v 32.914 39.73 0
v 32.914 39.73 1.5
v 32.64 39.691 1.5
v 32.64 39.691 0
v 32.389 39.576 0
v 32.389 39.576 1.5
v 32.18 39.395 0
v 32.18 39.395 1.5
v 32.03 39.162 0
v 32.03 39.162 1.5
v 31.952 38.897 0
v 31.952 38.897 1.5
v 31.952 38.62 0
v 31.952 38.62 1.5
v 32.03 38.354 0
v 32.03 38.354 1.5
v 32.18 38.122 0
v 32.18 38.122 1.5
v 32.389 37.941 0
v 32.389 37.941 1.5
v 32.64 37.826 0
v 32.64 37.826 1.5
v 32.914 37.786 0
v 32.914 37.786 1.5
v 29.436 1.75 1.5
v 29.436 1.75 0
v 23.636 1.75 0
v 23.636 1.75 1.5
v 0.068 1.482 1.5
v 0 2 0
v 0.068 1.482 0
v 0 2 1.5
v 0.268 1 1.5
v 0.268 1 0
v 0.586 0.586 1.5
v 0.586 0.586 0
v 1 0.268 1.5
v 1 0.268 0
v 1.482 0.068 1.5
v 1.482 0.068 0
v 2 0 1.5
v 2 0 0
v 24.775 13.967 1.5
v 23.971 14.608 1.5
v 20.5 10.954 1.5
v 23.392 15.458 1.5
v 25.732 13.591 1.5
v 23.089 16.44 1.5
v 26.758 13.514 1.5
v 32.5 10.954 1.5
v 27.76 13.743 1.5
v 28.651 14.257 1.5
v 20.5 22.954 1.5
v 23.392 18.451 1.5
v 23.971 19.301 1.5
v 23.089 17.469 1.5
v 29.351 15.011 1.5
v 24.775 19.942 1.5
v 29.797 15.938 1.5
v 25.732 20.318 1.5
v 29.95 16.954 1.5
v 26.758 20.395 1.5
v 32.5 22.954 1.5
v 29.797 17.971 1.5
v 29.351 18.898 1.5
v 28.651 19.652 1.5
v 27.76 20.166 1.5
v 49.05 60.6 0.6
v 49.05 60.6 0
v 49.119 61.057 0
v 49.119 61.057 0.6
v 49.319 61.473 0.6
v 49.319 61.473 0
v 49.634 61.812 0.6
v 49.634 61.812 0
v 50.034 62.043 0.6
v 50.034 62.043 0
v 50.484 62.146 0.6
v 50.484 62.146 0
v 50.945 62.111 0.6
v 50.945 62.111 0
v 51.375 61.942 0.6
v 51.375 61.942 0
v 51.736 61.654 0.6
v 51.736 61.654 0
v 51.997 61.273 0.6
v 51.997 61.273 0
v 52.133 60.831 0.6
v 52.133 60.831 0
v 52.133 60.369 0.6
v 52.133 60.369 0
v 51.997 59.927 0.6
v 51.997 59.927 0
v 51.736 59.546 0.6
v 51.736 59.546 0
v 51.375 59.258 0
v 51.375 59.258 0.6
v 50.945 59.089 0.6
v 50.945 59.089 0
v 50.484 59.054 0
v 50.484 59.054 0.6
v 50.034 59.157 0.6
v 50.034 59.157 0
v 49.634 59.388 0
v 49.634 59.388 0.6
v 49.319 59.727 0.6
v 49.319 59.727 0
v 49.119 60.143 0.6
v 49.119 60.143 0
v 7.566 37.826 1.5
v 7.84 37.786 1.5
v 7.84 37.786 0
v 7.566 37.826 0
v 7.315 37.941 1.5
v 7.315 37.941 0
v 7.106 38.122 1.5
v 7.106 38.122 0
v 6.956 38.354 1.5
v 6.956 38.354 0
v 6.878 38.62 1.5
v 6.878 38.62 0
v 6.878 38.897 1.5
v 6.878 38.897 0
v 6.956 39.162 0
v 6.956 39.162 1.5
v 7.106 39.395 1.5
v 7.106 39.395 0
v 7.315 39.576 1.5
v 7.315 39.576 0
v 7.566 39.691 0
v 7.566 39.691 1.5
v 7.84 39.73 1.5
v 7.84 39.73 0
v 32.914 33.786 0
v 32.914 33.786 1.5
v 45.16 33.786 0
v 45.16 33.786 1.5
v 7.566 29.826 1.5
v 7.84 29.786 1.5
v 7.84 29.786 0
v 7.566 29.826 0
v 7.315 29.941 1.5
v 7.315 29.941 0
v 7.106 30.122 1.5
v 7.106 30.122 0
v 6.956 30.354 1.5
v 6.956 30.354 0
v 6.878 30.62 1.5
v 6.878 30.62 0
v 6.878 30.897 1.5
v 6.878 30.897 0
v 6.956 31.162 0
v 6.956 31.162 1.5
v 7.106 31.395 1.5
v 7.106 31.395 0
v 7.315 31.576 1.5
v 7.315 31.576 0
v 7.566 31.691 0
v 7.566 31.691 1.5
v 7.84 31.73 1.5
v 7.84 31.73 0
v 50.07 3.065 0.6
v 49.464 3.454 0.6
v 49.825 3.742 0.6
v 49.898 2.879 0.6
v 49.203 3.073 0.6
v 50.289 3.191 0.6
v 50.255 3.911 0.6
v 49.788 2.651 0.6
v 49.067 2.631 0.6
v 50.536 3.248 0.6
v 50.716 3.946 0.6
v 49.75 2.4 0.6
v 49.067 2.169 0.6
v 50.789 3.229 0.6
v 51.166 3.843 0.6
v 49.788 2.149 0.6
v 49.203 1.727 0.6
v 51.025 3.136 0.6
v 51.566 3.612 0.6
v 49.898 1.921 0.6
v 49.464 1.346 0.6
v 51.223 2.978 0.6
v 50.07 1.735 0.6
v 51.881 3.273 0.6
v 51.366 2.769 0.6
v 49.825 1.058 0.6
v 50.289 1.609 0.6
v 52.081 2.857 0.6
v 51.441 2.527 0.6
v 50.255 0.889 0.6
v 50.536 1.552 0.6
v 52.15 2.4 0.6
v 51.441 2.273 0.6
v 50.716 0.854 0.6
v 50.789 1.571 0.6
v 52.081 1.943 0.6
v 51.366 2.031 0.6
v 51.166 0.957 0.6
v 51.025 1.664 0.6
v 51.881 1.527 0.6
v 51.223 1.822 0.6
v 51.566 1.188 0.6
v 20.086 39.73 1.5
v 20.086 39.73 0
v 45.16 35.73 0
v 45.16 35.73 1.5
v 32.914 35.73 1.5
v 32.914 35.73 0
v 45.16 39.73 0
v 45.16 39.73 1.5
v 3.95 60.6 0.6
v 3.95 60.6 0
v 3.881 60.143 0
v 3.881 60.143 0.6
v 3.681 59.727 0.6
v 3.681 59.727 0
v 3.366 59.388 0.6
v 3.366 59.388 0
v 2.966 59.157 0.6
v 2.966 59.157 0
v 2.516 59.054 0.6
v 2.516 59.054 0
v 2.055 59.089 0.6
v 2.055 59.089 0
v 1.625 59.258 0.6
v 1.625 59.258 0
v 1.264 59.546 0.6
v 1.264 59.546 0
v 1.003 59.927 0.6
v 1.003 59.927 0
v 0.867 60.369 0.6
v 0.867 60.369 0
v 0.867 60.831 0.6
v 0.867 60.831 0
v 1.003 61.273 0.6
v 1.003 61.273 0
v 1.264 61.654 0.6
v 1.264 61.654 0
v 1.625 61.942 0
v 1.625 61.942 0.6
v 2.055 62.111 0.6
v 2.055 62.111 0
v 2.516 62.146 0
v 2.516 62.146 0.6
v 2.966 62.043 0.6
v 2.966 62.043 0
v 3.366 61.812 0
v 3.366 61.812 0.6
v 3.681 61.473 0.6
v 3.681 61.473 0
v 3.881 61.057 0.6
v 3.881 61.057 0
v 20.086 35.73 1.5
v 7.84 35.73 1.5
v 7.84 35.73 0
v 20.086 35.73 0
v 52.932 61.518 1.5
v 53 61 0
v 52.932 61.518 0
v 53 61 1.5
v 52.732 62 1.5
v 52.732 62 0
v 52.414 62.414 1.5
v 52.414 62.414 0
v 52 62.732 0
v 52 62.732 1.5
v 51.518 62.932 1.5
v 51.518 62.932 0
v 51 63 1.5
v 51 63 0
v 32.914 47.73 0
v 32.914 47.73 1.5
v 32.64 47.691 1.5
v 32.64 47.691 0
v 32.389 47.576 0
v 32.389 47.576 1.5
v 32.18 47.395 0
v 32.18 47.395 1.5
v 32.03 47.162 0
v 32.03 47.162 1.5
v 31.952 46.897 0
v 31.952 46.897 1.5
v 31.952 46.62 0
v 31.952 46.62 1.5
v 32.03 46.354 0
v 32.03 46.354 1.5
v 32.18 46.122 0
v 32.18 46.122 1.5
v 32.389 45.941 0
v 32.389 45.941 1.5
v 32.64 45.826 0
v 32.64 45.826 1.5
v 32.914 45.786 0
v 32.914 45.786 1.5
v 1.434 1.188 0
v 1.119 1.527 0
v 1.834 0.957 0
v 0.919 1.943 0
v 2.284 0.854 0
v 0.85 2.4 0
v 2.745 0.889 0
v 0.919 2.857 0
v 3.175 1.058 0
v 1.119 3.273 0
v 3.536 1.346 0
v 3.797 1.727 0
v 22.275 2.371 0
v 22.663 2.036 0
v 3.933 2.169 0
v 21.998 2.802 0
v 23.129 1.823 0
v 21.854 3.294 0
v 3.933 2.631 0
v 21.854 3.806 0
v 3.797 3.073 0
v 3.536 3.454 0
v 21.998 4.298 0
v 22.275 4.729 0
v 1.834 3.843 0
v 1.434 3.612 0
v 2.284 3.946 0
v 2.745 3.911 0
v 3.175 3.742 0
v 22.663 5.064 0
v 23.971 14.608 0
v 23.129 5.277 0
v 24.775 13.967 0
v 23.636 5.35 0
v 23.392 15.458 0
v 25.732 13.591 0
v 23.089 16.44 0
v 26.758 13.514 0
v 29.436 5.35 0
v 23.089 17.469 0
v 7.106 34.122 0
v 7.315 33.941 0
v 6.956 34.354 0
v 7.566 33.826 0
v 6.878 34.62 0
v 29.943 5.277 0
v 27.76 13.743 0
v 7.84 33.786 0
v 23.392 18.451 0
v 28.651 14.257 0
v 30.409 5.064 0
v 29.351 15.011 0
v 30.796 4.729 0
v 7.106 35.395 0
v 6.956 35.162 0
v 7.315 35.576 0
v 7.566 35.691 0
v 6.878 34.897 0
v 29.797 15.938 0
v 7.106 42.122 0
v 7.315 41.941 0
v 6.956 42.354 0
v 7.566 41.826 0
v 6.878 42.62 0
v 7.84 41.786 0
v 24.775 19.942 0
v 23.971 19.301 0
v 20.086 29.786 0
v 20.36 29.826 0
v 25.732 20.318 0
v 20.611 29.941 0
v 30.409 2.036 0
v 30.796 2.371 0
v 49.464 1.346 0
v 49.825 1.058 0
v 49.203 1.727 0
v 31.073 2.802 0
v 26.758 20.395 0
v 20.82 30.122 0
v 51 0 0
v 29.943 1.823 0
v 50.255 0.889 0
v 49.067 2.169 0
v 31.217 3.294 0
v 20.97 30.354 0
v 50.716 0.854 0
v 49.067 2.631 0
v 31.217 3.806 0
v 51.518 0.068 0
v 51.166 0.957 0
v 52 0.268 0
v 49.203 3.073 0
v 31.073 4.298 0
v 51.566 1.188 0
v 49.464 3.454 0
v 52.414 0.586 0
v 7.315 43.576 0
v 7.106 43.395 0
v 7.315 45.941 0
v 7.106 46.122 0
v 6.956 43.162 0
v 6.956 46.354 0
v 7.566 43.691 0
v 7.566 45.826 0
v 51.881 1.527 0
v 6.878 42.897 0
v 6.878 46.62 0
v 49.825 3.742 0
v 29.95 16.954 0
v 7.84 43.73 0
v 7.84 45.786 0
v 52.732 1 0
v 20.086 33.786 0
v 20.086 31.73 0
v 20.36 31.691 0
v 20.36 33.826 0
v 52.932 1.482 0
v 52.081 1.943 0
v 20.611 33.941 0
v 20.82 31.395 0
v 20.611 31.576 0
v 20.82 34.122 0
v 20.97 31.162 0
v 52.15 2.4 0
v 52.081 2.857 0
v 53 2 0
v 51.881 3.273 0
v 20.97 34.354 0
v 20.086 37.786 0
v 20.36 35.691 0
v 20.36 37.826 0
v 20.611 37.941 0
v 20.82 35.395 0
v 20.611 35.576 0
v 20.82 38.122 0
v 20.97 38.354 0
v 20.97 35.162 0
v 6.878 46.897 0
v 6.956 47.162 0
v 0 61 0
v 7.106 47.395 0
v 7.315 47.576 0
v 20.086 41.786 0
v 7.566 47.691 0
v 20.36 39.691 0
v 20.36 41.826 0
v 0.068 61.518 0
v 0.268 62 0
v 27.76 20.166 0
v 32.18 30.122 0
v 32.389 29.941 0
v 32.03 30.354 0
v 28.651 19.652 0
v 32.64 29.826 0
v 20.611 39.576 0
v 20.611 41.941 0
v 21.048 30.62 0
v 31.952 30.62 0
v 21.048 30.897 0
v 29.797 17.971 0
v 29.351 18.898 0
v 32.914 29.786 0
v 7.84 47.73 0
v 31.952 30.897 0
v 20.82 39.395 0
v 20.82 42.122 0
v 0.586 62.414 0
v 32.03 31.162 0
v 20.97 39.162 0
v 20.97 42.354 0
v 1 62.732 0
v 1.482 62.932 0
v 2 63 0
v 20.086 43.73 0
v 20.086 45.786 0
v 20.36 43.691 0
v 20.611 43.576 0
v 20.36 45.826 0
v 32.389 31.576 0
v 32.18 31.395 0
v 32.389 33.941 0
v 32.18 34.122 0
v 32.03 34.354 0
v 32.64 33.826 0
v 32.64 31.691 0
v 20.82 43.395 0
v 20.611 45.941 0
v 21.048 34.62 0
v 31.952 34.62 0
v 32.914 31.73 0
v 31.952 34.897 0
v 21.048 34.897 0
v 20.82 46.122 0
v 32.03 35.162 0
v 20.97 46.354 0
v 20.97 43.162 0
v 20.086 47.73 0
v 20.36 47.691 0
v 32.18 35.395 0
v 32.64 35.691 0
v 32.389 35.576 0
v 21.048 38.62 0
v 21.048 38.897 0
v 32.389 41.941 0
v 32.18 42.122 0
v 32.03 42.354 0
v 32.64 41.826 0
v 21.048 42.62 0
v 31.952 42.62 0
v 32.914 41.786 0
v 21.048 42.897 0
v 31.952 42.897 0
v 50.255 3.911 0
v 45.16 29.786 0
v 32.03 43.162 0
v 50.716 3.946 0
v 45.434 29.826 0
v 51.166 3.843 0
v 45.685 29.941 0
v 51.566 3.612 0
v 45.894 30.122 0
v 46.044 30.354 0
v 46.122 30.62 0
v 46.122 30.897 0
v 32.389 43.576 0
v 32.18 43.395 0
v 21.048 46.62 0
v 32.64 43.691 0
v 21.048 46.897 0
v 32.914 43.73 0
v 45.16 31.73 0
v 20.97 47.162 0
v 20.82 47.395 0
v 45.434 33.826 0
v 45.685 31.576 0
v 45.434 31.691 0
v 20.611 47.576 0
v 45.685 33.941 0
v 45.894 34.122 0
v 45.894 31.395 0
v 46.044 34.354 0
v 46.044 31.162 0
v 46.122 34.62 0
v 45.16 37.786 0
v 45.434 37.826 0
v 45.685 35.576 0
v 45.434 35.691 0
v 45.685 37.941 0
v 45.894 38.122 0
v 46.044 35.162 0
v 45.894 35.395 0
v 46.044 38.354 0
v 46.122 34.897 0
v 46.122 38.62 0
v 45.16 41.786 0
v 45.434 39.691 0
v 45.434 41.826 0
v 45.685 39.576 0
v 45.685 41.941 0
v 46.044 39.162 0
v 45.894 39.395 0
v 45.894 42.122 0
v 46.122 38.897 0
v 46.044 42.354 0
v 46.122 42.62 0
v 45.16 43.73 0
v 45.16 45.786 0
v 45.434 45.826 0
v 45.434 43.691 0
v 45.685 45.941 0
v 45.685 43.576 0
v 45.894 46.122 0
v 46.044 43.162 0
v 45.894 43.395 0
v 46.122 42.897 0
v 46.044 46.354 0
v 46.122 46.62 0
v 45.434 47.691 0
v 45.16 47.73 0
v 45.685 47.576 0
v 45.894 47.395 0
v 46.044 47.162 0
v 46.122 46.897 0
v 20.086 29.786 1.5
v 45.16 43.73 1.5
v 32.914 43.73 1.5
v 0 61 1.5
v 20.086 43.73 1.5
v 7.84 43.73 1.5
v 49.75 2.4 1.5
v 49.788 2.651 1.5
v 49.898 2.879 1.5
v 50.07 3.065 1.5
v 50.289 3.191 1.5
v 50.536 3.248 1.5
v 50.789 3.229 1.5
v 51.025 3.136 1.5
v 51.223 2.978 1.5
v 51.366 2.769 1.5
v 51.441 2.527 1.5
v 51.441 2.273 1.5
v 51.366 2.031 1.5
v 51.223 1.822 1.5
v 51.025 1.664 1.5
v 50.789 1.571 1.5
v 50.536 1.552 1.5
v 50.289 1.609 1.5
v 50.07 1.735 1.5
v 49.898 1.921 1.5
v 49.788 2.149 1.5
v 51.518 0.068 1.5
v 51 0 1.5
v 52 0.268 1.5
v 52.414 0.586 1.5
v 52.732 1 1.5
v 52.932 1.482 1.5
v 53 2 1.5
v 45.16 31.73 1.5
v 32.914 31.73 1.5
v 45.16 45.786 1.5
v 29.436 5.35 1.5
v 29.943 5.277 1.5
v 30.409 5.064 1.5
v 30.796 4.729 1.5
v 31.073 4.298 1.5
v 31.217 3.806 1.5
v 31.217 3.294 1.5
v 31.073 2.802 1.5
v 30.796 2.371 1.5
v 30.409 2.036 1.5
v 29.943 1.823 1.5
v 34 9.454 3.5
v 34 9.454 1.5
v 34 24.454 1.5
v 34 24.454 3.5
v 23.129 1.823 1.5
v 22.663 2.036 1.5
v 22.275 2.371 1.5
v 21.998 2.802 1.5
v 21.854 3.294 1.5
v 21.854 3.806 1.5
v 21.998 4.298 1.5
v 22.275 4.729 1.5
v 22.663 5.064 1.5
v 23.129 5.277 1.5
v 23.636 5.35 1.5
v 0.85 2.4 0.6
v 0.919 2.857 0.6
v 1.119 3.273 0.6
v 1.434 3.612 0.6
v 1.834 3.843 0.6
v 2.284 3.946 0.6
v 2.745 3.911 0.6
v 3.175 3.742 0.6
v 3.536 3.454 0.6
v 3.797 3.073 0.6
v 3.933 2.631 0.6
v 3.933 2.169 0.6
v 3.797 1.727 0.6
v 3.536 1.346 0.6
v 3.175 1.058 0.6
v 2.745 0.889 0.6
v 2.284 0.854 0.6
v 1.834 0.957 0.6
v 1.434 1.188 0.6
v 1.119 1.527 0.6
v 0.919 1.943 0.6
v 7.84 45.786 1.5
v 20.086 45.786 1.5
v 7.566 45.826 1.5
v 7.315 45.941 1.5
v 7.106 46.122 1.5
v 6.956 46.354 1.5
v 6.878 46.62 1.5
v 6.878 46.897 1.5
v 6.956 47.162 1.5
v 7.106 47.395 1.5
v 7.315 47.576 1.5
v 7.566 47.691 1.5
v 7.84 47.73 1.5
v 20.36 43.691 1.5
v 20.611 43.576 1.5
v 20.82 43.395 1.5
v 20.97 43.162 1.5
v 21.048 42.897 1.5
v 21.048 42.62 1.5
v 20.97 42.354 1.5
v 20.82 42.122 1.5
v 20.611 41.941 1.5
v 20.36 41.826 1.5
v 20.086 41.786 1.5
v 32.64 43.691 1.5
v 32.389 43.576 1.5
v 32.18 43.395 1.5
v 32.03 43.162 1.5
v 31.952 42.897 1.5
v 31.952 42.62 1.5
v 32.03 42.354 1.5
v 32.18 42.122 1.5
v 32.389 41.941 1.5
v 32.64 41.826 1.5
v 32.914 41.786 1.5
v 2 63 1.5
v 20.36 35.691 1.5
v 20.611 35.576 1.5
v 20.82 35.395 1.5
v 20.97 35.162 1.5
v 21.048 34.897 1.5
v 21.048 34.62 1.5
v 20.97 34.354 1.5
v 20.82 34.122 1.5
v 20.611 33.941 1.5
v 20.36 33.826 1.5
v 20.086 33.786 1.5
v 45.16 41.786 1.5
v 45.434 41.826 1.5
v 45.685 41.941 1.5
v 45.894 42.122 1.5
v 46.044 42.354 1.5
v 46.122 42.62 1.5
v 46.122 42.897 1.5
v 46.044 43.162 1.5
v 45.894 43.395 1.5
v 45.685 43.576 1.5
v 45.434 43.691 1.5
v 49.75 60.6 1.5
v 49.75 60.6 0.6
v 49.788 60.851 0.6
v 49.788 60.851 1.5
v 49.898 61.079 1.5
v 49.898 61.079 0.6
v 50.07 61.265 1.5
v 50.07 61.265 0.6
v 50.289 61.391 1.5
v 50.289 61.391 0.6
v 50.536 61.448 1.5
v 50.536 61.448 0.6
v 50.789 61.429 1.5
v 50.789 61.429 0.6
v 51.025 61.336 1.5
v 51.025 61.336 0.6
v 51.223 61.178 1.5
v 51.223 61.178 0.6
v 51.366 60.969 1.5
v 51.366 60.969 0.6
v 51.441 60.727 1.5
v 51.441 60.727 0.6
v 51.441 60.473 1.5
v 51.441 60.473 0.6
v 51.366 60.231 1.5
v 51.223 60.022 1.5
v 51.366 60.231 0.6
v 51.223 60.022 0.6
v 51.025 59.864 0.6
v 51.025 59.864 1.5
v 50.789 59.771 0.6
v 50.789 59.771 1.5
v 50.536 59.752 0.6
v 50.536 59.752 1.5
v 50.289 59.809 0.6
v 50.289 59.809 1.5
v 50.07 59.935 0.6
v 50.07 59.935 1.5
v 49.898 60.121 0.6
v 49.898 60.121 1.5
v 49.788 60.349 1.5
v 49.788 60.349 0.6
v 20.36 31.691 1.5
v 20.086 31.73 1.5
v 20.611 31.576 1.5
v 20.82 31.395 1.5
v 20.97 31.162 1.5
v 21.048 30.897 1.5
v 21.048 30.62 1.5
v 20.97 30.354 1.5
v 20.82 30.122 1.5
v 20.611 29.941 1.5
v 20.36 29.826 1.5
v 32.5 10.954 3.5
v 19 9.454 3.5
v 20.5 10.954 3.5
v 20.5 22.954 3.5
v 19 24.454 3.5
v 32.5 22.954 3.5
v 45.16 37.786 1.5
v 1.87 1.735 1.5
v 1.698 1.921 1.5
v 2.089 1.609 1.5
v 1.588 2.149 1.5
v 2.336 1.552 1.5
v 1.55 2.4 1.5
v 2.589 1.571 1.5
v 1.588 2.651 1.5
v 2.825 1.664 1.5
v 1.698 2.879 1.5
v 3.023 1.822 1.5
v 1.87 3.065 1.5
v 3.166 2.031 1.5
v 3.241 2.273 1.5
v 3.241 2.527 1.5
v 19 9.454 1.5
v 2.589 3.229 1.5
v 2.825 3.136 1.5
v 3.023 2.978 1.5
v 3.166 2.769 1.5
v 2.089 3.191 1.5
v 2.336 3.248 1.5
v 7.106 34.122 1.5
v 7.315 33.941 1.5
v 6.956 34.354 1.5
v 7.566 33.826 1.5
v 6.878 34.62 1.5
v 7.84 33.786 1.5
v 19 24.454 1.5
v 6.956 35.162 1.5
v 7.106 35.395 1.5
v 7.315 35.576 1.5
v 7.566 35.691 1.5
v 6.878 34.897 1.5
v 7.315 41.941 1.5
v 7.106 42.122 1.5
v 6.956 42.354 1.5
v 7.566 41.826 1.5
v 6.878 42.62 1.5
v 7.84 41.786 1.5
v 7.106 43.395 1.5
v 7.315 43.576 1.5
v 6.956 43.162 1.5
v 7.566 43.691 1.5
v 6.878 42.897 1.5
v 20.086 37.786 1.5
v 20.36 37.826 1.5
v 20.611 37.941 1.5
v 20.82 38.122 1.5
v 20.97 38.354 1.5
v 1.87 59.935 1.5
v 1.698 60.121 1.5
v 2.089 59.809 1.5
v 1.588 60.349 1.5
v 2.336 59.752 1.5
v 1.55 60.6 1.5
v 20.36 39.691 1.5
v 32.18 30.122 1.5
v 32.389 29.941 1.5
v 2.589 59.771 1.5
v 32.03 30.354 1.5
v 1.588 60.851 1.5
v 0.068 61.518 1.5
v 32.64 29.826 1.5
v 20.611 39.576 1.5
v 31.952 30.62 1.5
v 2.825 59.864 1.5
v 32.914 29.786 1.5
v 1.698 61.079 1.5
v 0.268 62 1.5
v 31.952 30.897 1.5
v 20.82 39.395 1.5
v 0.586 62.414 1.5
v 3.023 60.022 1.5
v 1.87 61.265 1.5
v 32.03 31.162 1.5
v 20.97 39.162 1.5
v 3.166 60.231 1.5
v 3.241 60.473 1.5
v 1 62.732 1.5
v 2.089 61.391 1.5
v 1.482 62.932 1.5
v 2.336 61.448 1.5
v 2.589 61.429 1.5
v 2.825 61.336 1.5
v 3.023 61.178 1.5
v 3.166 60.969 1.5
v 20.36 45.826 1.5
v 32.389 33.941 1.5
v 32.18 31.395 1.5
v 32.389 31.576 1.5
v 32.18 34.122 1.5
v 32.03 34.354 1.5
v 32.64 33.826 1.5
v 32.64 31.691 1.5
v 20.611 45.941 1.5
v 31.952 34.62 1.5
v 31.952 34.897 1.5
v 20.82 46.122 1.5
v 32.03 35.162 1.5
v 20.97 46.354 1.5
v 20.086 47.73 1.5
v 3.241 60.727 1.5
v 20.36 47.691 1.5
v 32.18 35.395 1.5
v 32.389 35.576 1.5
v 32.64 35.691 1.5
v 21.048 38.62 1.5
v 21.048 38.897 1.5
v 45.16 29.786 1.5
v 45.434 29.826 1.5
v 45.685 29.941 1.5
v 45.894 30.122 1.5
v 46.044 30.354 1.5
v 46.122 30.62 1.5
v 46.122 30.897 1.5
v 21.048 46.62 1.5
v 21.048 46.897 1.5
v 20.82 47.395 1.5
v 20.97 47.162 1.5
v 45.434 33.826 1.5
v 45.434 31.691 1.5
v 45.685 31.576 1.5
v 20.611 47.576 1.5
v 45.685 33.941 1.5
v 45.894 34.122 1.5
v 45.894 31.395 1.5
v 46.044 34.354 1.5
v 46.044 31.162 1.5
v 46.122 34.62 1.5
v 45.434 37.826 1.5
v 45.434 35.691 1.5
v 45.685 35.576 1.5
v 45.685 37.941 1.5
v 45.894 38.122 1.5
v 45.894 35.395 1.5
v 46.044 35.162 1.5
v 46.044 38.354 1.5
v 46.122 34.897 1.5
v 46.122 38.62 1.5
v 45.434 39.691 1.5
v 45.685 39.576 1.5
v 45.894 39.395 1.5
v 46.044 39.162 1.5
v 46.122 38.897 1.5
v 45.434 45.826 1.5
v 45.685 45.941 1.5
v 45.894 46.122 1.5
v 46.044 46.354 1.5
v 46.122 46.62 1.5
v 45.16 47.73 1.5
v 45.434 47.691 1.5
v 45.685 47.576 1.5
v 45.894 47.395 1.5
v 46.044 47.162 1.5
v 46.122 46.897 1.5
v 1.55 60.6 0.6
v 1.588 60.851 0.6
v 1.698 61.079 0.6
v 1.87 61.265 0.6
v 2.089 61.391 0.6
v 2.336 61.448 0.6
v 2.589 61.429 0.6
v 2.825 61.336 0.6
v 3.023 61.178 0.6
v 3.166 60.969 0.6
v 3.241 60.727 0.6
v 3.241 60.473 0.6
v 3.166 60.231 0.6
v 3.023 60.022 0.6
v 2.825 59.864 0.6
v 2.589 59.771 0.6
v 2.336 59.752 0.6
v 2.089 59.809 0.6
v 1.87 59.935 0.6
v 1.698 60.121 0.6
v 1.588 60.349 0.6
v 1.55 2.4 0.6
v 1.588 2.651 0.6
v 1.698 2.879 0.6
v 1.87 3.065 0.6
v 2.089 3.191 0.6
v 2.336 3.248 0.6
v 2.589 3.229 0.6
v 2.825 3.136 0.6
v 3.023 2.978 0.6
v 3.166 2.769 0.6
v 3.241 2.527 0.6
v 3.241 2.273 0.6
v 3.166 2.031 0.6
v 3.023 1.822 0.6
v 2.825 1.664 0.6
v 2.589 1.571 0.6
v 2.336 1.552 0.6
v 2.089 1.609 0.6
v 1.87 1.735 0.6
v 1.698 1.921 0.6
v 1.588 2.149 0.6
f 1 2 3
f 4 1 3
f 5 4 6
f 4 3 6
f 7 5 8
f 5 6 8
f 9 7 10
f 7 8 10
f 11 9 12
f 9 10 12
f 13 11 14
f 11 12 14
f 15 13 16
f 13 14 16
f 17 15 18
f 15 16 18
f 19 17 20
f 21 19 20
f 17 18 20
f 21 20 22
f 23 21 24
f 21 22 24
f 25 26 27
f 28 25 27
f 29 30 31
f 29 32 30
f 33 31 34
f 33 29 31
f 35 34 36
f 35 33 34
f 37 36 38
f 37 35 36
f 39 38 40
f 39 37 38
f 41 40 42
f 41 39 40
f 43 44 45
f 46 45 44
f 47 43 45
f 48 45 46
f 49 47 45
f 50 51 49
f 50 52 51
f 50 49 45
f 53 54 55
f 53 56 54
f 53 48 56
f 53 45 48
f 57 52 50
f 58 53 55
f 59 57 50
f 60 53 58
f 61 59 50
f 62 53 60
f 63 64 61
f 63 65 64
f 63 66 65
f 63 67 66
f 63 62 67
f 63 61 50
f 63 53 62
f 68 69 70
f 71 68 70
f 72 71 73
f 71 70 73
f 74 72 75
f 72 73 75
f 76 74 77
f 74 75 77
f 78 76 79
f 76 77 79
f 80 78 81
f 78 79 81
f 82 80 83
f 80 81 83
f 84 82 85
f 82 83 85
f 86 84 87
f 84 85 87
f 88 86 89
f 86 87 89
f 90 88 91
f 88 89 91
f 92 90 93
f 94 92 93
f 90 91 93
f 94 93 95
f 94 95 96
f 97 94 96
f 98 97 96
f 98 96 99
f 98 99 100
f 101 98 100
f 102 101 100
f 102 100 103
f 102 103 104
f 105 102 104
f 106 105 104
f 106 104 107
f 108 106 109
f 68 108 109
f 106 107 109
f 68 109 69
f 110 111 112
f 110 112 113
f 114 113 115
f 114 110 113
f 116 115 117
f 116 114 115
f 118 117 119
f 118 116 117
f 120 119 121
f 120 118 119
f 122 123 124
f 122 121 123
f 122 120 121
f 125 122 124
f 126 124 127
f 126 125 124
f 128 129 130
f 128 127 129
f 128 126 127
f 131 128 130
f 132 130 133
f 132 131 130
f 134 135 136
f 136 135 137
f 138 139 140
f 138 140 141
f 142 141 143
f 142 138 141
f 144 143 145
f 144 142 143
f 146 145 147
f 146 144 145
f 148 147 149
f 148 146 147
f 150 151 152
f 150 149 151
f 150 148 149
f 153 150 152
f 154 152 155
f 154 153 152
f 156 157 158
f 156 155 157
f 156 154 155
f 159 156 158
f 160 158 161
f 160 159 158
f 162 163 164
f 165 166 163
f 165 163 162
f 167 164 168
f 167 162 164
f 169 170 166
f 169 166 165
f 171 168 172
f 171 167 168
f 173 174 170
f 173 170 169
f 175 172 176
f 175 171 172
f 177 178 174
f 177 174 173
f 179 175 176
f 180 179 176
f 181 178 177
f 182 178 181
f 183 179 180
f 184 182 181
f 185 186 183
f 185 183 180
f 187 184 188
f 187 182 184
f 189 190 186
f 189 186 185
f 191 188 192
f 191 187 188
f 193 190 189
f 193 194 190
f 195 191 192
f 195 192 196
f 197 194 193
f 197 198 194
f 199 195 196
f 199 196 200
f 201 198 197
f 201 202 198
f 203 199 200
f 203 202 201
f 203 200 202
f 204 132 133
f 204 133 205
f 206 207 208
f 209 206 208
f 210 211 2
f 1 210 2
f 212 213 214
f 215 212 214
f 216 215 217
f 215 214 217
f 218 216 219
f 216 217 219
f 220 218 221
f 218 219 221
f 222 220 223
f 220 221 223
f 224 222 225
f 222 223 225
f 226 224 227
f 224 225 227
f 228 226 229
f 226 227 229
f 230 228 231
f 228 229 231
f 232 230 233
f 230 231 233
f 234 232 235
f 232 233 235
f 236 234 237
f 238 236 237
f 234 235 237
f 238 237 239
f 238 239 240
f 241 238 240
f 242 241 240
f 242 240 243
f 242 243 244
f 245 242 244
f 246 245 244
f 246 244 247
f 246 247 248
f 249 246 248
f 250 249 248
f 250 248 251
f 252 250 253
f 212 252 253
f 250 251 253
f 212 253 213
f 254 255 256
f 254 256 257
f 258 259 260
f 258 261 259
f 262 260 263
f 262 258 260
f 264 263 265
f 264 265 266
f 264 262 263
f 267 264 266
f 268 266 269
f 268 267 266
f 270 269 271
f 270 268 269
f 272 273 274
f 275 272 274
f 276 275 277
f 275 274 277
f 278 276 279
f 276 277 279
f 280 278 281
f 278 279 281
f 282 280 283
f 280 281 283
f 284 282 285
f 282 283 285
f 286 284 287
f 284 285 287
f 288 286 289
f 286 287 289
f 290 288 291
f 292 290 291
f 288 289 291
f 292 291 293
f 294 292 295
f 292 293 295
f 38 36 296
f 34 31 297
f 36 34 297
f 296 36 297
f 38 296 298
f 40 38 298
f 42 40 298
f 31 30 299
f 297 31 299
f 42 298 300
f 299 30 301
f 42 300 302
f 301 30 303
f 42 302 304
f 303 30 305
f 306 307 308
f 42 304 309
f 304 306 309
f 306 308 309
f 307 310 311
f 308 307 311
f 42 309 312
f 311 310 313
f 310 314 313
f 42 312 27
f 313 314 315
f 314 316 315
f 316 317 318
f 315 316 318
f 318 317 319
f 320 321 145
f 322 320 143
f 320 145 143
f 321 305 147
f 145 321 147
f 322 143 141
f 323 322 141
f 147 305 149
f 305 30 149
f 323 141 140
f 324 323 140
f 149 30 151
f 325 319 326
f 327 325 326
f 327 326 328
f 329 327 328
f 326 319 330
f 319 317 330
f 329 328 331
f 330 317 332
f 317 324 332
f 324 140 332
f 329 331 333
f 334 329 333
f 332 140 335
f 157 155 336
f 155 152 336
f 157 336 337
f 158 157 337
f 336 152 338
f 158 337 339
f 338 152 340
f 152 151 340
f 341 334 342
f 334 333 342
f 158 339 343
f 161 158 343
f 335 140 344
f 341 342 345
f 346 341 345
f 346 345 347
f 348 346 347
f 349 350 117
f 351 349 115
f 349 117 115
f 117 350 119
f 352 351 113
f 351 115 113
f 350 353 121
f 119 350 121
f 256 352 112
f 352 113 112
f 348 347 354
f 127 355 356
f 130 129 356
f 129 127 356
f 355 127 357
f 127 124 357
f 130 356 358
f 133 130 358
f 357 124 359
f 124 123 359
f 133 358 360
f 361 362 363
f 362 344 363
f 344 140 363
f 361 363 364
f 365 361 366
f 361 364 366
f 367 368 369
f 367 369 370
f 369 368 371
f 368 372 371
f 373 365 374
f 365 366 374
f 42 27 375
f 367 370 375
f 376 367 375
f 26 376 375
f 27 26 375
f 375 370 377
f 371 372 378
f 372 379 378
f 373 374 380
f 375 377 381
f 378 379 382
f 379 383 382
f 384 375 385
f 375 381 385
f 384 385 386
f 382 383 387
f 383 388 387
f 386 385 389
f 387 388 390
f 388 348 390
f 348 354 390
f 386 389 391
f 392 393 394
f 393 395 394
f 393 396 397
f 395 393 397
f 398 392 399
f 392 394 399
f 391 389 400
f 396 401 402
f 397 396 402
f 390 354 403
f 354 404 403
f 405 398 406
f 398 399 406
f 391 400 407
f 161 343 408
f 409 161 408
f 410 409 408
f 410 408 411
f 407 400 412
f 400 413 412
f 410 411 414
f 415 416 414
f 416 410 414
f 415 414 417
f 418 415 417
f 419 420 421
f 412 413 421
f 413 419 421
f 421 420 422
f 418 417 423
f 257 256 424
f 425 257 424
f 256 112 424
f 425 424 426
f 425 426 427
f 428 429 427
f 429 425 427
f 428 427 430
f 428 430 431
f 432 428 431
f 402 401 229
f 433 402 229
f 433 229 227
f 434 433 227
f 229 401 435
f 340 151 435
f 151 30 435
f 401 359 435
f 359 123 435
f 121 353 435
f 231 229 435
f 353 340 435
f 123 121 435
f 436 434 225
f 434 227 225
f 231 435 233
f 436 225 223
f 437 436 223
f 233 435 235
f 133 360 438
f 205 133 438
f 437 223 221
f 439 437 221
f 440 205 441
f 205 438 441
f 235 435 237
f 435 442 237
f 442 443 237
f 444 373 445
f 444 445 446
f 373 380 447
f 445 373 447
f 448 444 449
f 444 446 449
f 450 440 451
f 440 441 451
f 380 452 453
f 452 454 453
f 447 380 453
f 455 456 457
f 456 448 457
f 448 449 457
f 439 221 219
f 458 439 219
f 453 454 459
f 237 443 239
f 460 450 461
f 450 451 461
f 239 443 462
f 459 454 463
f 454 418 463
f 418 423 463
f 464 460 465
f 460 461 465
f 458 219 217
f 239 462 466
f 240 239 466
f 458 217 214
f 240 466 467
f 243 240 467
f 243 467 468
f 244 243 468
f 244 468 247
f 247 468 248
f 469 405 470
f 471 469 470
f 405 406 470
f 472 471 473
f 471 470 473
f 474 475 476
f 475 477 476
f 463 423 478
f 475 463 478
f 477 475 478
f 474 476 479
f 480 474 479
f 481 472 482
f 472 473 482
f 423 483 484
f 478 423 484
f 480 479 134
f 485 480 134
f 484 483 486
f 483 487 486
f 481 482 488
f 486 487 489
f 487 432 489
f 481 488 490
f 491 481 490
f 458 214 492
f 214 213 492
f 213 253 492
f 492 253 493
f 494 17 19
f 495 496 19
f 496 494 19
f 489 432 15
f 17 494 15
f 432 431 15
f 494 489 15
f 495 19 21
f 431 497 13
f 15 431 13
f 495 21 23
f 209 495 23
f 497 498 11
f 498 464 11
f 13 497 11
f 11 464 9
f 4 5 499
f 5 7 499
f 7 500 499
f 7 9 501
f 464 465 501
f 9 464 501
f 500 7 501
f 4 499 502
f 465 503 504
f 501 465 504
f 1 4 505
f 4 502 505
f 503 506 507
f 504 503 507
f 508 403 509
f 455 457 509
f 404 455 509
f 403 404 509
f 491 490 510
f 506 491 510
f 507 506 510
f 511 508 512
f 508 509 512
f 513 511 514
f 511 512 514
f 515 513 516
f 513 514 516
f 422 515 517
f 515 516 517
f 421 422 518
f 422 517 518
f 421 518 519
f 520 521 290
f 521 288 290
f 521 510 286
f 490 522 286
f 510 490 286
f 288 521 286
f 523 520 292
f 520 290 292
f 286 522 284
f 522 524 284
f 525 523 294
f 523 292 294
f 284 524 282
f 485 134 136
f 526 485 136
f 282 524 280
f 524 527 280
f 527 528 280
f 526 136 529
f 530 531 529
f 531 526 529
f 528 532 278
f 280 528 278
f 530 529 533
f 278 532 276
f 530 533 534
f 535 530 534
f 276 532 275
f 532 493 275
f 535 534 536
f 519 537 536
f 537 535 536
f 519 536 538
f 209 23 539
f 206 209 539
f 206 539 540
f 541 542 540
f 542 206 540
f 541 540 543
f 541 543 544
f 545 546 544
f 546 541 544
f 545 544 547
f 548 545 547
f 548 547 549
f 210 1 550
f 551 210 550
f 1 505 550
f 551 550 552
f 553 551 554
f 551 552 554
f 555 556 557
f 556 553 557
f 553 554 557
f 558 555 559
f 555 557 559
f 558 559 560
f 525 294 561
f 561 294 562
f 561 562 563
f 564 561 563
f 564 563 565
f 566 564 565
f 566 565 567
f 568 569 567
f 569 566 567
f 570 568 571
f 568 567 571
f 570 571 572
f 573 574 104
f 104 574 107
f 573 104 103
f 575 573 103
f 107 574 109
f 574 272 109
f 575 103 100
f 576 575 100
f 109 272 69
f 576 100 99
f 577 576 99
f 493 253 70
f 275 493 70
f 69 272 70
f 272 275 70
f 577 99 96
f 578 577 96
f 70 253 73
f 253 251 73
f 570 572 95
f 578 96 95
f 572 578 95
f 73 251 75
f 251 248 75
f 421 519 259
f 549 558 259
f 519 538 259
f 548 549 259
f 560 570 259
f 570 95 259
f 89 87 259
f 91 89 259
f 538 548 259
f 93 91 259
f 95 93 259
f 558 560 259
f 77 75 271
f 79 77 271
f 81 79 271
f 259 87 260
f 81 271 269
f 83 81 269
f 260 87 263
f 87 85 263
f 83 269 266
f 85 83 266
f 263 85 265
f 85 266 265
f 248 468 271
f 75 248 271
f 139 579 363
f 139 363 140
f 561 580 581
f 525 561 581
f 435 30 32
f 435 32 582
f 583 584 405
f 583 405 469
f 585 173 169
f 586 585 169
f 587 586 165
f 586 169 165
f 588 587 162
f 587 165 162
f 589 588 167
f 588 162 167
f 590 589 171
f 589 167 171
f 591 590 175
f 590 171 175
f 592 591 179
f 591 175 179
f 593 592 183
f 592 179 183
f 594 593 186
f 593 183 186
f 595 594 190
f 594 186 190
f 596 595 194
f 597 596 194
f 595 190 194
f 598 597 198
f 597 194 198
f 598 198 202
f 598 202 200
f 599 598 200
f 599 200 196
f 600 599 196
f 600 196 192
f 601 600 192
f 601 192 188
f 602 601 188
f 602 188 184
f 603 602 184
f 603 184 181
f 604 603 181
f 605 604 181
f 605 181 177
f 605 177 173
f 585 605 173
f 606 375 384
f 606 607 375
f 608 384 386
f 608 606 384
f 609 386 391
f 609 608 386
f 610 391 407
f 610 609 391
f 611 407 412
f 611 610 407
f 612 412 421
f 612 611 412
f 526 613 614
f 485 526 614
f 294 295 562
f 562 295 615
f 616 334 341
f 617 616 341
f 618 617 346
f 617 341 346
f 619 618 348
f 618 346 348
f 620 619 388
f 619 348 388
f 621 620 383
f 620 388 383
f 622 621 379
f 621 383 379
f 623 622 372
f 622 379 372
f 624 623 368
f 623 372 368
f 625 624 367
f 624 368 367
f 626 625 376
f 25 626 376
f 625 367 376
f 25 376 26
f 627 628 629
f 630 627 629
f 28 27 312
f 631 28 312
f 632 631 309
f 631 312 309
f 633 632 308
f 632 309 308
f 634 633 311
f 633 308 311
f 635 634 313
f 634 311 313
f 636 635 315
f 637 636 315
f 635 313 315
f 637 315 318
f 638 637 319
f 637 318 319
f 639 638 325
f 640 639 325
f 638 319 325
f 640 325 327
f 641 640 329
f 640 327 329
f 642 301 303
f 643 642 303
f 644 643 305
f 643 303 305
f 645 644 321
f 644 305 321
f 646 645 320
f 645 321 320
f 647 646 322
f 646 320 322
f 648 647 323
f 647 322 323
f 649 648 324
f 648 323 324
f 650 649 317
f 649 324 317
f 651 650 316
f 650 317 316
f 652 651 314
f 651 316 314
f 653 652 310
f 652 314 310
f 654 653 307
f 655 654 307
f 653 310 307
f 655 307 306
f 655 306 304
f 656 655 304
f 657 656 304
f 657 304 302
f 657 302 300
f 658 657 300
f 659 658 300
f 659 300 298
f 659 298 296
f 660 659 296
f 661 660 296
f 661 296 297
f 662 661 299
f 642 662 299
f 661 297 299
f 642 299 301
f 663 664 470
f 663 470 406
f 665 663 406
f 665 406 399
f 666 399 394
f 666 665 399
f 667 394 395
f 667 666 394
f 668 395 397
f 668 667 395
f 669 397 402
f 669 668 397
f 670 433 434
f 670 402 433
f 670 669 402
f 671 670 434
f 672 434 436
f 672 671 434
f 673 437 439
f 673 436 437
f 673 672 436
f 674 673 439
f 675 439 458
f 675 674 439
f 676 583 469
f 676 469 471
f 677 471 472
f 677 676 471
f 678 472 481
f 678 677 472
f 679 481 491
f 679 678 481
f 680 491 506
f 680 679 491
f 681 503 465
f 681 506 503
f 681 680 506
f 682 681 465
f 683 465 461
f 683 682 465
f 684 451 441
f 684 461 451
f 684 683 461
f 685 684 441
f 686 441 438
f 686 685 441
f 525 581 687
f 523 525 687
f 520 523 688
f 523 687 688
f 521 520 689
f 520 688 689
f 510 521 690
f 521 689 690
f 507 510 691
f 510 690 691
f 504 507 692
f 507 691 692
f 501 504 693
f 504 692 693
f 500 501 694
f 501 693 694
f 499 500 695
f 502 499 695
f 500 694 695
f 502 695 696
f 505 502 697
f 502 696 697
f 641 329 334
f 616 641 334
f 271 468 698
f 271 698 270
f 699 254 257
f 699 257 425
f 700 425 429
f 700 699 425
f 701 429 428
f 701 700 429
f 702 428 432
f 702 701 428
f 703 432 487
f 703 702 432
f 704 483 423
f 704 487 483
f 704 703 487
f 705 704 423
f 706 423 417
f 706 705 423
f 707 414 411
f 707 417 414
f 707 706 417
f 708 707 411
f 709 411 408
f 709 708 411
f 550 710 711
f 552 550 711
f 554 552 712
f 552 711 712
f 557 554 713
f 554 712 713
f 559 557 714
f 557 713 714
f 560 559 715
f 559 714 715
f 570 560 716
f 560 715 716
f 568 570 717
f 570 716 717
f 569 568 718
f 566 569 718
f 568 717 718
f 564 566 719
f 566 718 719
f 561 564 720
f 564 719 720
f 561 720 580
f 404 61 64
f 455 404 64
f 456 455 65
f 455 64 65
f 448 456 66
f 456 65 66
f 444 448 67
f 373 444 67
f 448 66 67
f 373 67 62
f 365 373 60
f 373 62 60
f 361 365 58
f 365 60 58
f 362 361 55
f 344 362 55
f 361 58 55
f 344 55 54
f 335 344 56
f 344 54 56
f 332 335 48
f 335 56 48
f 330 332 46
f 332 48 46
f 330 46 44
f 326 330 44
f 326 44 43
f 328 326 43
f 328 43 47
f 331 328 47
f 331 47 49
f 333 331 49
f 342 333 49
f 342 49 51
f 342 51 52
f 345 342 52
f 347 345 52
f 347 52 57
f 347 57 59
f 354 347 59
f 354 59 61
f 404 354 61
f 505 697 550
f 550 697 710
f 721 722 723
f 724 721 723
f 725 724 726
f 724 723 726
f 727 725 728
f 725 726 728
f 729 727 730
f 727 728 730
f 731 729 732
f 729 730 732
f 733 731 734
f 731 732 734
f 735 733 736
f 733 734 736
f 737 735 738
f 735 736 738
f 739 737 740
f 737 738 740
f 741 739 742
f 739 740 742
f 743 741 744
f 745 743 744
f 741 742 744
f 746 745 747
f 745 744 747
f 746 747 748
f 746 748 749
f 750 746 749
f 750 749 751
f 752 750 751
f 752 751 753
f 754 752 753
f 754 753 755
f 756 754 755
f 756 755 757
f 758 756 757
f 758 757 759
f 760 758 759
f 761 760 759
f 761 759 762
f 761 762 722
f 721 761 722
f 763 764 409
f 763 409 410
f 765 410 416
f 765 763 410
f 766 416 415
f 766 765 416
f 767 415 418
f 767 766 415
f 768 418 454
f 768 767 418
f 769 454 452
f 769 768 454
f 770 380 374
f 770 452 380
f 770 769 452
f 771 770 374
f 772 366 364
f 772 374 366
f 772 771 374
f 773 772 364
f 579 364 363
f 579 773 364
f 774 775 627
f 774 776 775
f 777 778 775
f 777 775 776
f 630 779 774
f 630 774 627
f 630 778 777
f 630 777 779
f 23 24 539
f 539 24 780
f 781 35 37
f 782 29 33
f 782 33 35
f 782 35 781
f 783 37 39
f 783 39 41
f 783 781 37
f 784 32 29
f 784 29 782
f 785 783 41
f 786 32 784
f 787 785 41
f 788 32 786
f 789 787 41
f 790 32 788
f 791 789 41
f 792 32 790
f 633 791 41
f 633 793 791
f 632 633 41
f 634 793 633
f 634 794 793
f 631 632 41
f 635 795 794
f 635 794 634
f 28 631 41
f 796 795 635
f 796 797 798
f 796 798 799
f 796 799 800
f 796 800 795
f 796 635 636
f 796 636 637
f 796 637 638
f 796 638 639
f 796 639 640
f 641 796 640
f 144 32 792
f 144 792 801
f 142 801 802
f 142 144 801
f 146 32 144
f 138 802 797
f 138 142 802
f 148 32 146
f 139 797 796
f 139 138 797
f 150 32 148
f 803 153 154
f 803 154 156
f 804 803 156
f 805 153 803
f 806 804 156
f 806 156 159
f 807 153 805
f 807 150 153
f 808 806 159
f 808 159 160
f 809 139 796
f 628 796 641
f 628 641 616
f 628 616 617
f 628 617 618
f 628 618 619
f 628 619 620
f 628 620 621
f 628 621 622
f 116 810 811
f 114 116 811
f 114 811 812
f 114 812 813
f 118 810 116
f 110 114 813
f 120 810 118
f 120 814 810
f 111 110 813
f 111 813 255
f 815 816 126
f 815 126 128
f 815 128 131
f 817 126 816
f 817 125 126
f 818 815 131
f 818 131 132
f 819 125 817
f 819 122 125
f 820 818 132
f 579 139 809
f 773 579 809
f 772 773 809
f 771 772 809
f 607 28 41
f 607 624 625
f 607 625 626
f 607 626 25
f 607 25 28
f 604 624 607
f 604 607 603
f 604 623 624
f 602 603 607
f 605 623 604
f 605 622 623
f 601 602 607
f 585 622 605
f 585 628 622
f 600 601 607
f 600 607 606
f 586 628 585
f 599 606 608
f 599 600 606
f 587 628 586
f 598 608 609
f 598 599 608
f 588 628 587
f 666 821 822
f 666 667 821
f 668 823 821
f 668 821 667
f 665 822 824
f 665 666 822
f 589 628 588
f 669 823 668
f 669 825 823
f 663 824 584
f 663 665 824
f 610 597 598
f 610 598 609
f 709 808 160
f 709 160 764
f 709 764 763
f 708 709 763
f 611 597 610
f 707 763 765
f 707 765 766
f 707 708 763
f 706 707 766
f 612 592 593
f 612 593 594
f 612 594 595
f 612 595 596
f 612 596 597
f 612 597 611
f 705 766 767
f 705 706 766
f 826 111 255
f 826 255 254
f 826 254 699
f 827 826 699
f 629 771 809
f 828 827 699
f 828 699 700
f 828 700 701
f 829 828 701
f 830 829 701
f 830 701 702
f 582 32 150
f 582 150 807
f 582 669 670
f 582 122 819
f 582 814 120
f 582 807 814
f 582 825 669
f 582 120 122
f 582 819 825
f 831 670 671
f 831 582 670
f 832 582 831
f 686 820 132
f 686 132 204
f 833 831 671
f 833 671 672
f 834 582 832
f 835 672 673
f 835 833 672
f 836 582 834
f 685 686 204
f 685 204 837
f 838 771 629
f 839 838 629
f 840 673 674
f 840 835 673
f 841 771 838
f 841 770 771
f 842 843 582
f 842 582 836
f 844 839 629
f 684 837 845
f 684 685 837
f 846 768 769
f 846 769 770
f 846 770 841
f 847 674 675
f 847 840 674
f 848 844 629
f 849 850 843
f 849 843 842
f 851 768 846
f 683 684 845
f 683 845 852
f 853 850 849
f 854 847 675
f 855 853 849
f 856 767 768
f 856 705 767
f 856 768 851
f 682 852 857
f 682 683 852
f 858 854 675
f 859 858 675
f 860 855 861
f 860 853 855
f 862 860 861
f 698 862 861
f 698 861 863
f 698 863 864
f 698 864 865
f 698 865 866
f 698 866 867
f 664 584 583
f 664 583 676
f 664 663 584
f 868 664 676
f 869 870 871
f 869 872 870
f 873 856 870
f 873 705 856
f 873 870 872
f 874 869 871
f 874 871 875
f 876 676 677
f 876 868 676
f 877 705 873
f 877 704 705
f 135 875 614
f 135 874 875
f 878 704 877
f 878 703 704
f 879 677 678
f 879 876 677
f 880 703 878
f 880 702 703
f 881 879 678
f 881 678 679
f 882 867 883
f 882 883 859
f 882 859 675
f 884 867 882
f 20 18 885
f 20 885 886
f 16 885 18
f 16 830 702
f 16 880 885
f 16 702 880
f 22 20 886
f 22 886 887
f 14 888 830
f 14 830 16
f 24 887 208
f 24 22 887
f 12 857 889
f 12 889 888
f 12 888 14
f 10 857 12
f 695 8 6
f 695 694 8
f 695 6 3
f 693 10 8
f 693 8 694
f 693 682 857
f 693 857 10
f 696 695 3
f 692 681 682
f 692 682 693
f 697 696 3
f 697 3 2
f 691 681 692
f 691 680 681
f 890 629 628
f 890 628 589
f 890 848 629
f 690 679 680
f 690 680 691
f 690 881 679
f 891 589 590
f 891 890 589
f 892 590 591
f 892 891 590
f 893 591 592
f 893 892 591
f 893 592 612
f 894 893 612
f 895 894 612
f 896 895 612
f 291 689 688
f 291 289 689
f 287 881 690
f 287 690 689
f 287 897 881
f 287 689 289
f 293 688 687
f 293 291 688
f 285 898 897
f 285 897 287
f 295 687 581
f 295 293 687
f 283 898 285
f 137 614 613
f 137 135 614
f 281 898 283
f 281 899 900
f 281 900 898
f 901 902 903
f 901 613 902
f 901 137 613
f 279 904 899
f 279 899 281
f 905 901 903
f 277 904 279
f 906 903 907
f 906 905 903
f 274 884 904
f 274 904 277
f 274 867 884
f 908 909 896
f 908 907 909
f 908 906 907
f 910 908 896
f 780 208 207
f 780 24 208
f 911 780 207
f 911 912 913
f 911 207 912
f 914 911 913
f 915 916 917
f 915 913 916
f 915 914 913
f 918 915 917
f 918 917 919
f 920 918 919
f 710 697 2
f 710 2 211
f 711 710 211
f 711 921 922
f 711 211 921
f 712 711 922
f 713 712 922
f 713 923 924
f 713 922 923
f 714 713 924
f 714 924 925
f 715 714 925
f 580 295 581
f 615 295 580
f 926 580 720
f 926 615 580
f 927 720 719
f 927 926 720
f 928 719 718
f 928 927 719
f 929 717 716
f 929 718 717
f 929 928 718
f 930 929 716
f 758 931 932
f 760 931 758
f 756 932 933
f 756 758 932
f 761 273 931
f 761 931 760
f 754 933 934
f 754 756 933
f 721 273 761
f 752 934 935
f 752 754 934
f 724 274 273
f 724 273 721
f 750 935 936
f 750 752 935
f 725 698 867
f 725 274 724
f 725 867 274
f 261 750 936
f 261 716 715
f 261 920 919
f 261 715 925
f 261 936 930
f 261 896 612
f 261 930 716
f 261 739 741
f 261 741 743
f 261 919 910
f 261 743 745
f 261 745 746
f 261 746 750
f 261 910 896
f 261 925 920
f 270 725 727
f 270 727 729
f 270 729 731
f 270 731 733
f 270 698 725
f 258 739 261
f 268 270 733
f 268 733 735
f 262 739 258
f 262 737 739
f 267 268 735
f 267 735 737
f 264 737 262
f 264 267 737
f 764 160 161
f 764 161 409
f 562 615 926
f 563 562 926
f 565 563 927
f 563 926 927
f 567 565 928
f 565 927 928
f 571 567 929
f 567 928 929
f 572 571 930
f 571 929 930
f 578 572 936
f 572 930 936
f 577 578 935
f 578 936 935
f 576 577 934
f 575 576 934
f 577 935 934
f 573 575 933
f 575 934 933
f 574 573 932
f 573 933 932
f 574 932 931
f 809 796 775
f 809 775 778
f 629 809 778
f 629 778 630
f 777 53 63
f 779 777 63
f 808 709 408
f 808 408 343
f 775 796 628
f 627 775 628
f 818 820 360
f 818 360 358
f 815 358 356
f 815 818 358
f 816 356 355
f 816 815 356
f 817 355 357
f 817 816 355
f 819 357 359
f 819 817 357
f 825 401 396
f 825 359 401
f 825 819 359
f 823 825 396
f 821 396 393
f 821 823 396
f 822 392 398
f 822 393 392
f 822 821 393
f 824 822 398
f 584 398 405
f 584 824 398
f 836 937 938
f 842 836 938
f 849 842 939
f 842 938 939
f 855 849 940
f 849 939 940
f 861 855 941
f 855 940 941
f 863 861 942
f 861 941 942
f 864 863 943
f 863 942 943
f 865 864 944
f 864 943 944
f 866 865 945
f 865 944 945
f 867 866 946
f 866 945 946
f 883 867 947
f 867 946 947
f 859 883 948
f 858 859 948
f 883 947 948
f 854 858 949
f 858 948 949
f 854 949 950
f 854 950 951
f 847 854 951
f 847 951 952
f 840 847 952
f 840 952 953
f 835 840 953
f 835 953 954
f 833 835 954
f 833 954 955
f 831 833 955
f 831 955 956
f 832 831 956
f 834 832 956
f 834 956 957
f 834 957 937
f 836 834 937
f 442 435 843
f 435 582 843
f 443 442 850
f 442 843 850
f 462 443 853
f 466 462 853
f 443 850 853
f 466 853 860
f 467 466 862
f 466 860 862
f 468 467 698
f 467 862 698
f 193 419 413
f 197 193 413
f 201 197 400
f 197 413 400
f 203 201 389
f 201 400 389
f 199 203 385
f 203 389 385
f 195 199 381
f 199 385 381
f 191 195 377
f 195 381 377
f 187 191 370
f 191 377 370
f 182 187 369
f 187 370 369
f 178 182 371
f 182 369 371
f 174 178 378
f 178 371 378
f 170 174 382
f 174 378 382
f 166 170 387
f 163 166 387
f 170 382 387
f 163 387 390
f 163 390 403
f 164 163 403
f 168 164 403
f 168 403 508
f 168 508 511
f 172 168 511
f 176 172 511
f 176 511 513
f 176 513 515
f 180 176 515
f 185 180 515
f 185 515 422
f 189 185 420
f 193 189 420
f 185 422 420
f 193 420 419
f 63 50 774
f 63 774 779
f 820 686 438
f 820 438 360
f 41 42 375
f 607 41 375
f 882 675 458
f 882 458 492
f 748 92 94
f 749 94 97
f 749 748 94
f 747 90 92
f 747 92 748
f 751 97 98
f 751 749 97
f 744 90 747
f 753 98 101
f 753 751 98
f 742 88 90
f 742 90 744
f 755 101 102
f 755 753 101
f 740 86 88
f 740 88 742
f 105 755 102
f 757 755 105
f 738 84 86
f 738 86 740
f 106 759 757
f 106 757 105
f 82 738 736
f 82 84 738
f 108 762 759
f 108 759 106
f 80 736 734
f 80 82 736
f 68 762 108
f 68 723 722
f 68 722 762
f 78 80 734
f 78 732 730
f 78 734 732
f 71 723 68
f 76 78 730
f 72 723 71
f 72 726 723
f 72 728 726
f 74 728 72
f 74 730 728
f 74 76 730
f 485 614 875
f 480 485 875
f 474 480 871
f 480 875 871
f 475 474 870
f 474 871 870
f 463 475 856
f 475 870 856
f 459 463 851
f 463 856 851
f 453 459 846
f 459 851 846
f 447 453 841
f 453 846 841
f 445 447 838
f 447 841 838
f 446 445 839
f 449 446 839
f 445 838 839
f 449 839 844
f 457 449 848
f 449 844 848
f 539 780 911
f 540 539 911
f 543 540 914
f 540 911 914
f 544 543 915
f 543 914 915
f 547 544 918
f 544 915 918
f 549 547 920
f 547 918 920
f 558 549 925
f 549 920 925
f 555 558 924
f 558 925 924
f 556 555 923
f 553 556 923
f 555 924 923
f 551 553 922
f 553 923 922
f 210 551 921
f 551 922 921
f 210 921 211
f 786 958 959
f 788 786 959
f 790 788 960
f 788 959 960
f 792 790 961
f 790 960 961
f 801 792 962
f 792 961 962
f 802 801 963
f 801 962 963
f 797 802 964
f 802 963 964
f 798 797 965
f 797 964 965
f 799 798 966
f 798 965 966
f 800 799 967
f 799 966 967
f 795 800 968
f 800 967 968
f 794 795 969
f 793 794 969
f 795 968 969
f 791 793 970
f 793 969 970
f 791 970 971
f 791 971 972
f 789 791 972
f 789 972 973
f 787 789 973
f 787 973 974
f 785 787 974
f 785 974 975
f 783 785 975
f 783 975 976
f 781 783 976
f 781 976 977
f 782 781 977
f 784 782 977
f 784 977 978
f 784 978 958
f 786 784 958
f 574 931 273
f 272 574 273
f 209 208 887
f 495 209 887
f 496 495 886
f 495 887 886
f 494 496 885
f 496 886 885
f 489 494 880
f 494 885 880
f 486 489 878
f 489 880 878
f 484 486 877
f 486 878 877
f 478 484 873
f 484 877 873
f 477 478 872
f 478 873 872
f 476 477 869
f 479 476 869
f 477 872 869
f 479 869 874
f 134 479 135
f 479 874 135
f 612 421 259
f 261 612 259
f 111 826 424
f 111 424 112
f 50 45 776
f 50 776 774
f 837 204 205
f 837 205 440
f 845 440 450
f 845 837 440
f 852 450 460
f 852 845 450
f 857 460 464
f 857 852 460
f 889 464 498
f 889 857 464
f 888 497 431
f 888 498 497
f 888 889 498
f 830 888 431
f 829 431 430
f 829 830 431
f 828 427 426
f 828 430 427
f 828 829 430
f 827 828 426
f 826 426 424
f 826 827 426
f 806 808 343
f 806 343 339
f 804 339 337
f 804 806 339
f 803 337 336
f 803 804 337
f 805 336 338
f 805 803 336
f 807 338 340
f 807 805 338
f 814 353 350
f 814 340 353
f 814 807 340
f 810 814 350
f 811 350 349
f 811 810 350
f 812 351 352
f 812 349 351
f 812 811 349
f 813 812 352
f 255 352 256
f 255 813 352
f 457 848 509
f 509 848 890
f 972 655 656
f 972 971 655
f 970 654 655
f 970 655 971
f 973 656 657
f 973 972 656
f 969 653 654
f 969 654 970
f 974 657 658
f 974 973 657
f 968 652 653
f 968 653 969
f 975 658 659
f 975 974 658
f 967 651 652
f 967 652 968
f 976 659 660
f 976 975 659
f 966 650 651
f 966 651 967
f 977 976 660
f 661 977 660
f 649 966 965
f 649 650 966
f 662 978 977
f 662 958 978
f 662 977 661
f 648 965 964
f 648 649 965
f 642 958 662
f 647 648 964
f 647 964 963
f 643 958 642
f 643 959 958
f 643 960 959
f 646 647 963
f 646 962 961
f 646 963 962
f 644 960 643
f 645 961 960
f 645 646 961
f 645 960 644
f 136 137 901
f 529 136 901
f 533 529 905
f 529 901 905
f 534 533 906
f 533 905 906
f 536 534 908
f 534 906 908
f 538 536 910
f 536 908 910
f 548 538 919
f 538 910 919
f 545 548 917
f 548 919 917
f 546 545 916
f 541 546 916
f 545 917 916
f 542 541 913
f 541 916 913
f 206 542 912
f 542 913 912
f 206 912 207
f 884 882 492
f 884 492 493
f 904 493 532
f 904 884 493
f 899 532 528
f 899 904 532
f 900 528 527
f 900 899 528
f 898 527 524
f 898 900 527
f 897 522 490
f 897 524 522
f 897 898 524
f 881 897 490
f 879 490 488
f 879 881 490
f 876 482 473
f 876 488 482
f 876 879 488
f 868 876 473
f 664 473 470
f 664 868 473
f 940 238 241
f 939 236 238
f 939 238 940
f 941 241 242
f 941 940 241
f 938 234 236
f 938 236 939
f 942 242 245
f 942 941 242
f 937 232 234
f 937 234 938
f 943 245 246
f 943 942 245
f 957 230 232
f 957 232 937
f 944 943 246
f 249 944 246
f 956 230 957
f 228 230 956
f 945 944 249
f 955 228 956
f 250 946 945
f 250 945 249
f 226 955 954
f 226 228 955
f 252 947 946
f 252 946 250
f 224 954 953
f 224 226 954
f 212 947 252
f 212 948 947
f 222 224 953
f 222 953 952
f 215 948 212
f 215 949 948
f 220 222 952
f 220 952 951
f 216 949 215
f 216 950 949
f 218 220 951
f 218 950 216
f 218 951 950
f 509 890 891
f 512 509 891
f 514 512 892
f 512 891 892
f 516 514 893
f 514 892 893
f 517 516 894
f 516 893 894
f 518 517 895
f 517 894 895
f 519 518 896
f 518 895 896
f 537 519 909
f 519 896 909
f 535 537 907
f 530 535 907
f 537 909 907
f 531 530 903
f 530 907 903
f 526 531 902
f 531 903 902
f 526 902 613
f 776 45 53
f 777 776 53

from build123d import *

# Parameters (mm, degrees)
SKETCH_1_W          = 53
SKETCH_1_H          = 63
EXTRUDE_1_DEPTH     = 1.5
FILLET_1_R          = 2
CUT_EXTRUDE_2_DEPTH = 83.342273469
CUT_EXTRUDE_3_DEPTH = 83.342273469
SKETCH_5_R          = 3.45
CUT_EXTRUDE_4_DEPTH = 83.342273469
SKETCH_6_W          = 15
SKETCH_6_H          = 15
SKETCH_6_W_2        = 12
SKETCH_6_H_2        = 12
EXTRUDE_1_2_DEPTH   = 2
SKETCH_9_R          = 0.85
CUT_EXTRUDE_5_DEPTH = 83.402973247
SKETCH_10_R         = 1.55
CUT_EXTRUDE_6_DEPTH = 0.6


with BuildPart() as part:
    # 草图1 → Extrude 1 (new body)
    with BuildSketch(Plane.XY):
        with Locations((26.5, 31.5)):
            Rectangle(SKETCH_1_W, SKETCH_1_H)
    extrude(amount=EXTRUDE_1_DEPTH)

    # 圆角1
    fillet_1_edges = [part.edges().sort_by_distance(p)[0] for p in [
        (0, 63, 0.75),
        (53, 63, 0.75),
        (53, 0, 0.75),
        (0, 0, 0.75),
    ]]
    fillet(fillet_1_edges, radius=FILLET_1_R)

    # 草图3 → 切除-拉伸2 (cut, through all)
    with BuildSketch(Plane(origin=(0, 0, 0), x_dir=(-1, 0, 0), z_dir=(0, 0, -1))):
        with BuildLine():
            Line((-23.635661643, 5.35), (-29.435661643, 5.35))
            ThreePointArc((-29.435661643, 5.35), (-31.235661643, 3.55), (-29.435661643, 1.75))
            Line((-29.435661643, 1.75), (-23.635661643, 1.75))
            ThreePointArc((-23.635661643, 1.75), (-21.835661643, 3.55), (-23.635661643, 5.35))
        make_face()
    extrude(amount=-CUT_EXTRUDE_2_DEPTH, mode=Mode.SUBTRACT)

    # 草图4 → 切除-拉伸3 (cut, through all)
    with BuildSketch(Plane.XY.offset(1.5)):
        with BuildLine():
            Line((7.840284333, 47.730065189), (20.08572274, 47.730065189))
            ThreePointArc((20.08572274, 47.730065189), (21.057582931, 46.758204998), (20.08572274, 45.786344807))
            Line((20.08572274, 45.786344807), (7.840284333, 45.786344807))
            ThreePointArc((7.840284333, 45.786344807), (6.868424142, 46.758204998), (7.840284333, 47.730065189))
        make_face()
        with BuildLine():
            Line((7.840284333, 43.730065189), (20.08572274, 43.730065189))
            ThreePointArc((20.08572274, 43.730065189), (21.057582931, 42.758204998), (20.08572274, 41.786344807))
            Line((20.08572274, 41.786344807), (7.840284333, 41.786344807))
            ThreePointArc((7.840284333, 41.786344807), (6.868424142, 42.758204998), (7.840284333, 43.730065189))
        make_face()
        with BuildLine():
            Line((7.840284333, 39.730065189), (20.08572274, 39.730065189))
            ThreePointArc((20.08572274, 39.730065189), (21.057582931, 38.758204998), (20.08572274, 37.786344807))
            Line((20.08572274, 37.786344807), (7.840284333, 37.786344807))
            ThreePointArc((7.840284333, 37.786344807), (6.868424142, 38.758204998), (7.840284333, 39.730065189))
        make_face()
        with BuildLine():
            Line((7.840284333, 35.730065189), (20.08572274, 35.730065189))
            ThreePointArc((20.08572274, 35.730065189), (21.057582931, 34.758204998), (20.08572274, 33.786344807))
            Line((20.08572274, 33.786344807), (7.840284333, 33.786344807))
            ThreePointArc((7.840284333, 33.786344807), (6.868424142, 34.758204998), (7.840284333, 35.730065189))
        make_face()
        with BuildLine():
            Line((7.840284333, 31.730065189), (20.08572274, 31.730065189))
            ThreePointArc((20.08572274, 31.730065189), (21.057582931, 30.758204998), (20.08572274, 29.786344807))
            Line((20.08572274, 29.786344807), (7.840284333, 29.786344807))
            ThreePointArc((7.840284333, 29.786344807), (6.868424142, 30.758204998), (7.840284333, 31.730065189))
        make_face()
        with BuildLine():
            Line((45.159715667, 31.730065189), (32.91427726, 31.730065189))
            ThreePointArc((32.91427726, 31.730065189), (31.942417069, 30.758204998), (32.91427726, 29.786344807))
            Line((32.91427726, 29.786344807), (45.159715667, 29.786344807))
            ThreePointArc((45.159715667, 29.786344807), (46.131575858, 30.758204998), (45.159715667, 31.730065189))
        make_face()
        with BuildLine():
            Line((45.159715667, 35.730065189), (32.91427726, 35.730065189))
            ThreePointArc((32.91427726, 35.730065189), (31.942417069, 34.758204998), (32.91427726, 33.786344807))
            Line((32.91427726, 33.786344807), (45.159715667, 33.786344807))
            ThreePointArc((45.159715667, 33.786344807), (46.131575858, 34.758204998), (45.159715667, 35.730065189))
        make_face()
        with BuildLine():
            Line((45.159715667, 39.730065189), (32.91427726, 39.730065189))
            ThreePointArc((32.91427726, 39.730065189), (31.942417069, 38.758204998), (32.91427726, 37.786344807))
            Line((32.91427726, 37.786344807), (45.159715667, 37.786344807))
            ThreePointArc((45.159715667, 37.786344807), (46.131575858, 38.758204998), (45.159715667, 39.730065189))
        make_face()
        with BuildLine():
            Line((45.159715667, 43.730065189), (32.91427726, 43.730065189))
            ThreePointArc((32.91427726, 43.730065189), (31.942417069, 42.758204998), (32.91427726, 41.786344807))
            Line((32.91427726, 41.786344807), (45.159715667, 41.786344807))
            ThreePointArc((45.159715667, 41.786344807), (46.131575858, 42.758204998), (45.159715667, 43.730065189))
        make_face()
        with BuildLine():
            Line((45.159715667, 47.730065189), (32.91427726, 47.730065189))
            ThreePointArc((32.91427726, 47.730065189), (31.942417069, 46.758204998), (32.91427726, 45.786344807))
            Line((32.91427726, 45.786344807), (45.159715667, 45.786344807))
            ThreePointArc((45.159715667, 45.786344807), (46.131575858, 46.758204998), (45.159715667, 47.730065189))
        make_face()
    extrude(amount=-CUT_EXTRUDE_3_DEPTH, mode=Mode.SUBTRACT)

    # 草图5 → 切除-拉伸4 (cut, through all)
    with BuildSketch(Plane.XY.offset(1.5)):
        with Locations((26.5, 16.954492475)):
            Circle(SKETCH_5_R)
    extrude(amount=-CUT_EXTRUDE_4_DEPTH, mode=Mode.SUBTRACT)

    # 草图6 → Extrude 1 2 (add)
    with BuildSketch(Plane.XY.offset(1.5)):
        with Locations((26.5, 16.954492475)):
            Rectangle(SKETCH_6_W, SKETCH_6_H)
        with Locations((26.5, 16.954492475)):
            Rectangle(SKETCH_6_W_2, SKETCH_6_H_2, mode=Mode.SUBTRACT)
    extrude(amount=EXTRUDE_1_2_DEPTH)

    # 草图9 → 切除-拉伸5 (cut, through all)
    with BuildSketch(Plane(origin=(0, 0, 0), x_dir=(-1, 0, 0), z_dir=(0, 0, -1))):
        with Locations((-2.4, 2.4)):
            Circle(SKETCH_9_R)
        with Locations((-50.6, 60.6)):
            Circle(SKETCH_9_R)
        with Locations((-2.4, 60.6)):
            Circle(SKETCH_9_R)
        with Locations((-50.6, 2.4)):
            Circle(SKETCH_9_R)
    extrude(amount=-CUT_EXTRUDE_5_DEPTH, mode=Mode.SUBTRACT)

    # 草图10 → 切除-拉伸6 (cut)
    with BuildSketch(Plane(origin=(0, 0, 0), x_dir=(-1, 0, 0), z_dir=(0, 0, -1))):
        with Locations((-50.6, 60.6)):
            Circle(SKETCH_10_R)
        with Locations(Location((-2.4, 60.6, 0), (0, 0, 180))):
            Circle(SKETCH_10_R)
        with Locations((-2.4, 2.4)):
            Circle(SKETCH_10_R)
        with Locations(Location((-50.6, 2.4, 0), (0, 0, 180))):
            Circle(SKETCH_10_R)
    extrude(amount=-CUT_EXTRUDE_6_DEPTH, mode=Mode.SUBTRACT)


solid = part.part
